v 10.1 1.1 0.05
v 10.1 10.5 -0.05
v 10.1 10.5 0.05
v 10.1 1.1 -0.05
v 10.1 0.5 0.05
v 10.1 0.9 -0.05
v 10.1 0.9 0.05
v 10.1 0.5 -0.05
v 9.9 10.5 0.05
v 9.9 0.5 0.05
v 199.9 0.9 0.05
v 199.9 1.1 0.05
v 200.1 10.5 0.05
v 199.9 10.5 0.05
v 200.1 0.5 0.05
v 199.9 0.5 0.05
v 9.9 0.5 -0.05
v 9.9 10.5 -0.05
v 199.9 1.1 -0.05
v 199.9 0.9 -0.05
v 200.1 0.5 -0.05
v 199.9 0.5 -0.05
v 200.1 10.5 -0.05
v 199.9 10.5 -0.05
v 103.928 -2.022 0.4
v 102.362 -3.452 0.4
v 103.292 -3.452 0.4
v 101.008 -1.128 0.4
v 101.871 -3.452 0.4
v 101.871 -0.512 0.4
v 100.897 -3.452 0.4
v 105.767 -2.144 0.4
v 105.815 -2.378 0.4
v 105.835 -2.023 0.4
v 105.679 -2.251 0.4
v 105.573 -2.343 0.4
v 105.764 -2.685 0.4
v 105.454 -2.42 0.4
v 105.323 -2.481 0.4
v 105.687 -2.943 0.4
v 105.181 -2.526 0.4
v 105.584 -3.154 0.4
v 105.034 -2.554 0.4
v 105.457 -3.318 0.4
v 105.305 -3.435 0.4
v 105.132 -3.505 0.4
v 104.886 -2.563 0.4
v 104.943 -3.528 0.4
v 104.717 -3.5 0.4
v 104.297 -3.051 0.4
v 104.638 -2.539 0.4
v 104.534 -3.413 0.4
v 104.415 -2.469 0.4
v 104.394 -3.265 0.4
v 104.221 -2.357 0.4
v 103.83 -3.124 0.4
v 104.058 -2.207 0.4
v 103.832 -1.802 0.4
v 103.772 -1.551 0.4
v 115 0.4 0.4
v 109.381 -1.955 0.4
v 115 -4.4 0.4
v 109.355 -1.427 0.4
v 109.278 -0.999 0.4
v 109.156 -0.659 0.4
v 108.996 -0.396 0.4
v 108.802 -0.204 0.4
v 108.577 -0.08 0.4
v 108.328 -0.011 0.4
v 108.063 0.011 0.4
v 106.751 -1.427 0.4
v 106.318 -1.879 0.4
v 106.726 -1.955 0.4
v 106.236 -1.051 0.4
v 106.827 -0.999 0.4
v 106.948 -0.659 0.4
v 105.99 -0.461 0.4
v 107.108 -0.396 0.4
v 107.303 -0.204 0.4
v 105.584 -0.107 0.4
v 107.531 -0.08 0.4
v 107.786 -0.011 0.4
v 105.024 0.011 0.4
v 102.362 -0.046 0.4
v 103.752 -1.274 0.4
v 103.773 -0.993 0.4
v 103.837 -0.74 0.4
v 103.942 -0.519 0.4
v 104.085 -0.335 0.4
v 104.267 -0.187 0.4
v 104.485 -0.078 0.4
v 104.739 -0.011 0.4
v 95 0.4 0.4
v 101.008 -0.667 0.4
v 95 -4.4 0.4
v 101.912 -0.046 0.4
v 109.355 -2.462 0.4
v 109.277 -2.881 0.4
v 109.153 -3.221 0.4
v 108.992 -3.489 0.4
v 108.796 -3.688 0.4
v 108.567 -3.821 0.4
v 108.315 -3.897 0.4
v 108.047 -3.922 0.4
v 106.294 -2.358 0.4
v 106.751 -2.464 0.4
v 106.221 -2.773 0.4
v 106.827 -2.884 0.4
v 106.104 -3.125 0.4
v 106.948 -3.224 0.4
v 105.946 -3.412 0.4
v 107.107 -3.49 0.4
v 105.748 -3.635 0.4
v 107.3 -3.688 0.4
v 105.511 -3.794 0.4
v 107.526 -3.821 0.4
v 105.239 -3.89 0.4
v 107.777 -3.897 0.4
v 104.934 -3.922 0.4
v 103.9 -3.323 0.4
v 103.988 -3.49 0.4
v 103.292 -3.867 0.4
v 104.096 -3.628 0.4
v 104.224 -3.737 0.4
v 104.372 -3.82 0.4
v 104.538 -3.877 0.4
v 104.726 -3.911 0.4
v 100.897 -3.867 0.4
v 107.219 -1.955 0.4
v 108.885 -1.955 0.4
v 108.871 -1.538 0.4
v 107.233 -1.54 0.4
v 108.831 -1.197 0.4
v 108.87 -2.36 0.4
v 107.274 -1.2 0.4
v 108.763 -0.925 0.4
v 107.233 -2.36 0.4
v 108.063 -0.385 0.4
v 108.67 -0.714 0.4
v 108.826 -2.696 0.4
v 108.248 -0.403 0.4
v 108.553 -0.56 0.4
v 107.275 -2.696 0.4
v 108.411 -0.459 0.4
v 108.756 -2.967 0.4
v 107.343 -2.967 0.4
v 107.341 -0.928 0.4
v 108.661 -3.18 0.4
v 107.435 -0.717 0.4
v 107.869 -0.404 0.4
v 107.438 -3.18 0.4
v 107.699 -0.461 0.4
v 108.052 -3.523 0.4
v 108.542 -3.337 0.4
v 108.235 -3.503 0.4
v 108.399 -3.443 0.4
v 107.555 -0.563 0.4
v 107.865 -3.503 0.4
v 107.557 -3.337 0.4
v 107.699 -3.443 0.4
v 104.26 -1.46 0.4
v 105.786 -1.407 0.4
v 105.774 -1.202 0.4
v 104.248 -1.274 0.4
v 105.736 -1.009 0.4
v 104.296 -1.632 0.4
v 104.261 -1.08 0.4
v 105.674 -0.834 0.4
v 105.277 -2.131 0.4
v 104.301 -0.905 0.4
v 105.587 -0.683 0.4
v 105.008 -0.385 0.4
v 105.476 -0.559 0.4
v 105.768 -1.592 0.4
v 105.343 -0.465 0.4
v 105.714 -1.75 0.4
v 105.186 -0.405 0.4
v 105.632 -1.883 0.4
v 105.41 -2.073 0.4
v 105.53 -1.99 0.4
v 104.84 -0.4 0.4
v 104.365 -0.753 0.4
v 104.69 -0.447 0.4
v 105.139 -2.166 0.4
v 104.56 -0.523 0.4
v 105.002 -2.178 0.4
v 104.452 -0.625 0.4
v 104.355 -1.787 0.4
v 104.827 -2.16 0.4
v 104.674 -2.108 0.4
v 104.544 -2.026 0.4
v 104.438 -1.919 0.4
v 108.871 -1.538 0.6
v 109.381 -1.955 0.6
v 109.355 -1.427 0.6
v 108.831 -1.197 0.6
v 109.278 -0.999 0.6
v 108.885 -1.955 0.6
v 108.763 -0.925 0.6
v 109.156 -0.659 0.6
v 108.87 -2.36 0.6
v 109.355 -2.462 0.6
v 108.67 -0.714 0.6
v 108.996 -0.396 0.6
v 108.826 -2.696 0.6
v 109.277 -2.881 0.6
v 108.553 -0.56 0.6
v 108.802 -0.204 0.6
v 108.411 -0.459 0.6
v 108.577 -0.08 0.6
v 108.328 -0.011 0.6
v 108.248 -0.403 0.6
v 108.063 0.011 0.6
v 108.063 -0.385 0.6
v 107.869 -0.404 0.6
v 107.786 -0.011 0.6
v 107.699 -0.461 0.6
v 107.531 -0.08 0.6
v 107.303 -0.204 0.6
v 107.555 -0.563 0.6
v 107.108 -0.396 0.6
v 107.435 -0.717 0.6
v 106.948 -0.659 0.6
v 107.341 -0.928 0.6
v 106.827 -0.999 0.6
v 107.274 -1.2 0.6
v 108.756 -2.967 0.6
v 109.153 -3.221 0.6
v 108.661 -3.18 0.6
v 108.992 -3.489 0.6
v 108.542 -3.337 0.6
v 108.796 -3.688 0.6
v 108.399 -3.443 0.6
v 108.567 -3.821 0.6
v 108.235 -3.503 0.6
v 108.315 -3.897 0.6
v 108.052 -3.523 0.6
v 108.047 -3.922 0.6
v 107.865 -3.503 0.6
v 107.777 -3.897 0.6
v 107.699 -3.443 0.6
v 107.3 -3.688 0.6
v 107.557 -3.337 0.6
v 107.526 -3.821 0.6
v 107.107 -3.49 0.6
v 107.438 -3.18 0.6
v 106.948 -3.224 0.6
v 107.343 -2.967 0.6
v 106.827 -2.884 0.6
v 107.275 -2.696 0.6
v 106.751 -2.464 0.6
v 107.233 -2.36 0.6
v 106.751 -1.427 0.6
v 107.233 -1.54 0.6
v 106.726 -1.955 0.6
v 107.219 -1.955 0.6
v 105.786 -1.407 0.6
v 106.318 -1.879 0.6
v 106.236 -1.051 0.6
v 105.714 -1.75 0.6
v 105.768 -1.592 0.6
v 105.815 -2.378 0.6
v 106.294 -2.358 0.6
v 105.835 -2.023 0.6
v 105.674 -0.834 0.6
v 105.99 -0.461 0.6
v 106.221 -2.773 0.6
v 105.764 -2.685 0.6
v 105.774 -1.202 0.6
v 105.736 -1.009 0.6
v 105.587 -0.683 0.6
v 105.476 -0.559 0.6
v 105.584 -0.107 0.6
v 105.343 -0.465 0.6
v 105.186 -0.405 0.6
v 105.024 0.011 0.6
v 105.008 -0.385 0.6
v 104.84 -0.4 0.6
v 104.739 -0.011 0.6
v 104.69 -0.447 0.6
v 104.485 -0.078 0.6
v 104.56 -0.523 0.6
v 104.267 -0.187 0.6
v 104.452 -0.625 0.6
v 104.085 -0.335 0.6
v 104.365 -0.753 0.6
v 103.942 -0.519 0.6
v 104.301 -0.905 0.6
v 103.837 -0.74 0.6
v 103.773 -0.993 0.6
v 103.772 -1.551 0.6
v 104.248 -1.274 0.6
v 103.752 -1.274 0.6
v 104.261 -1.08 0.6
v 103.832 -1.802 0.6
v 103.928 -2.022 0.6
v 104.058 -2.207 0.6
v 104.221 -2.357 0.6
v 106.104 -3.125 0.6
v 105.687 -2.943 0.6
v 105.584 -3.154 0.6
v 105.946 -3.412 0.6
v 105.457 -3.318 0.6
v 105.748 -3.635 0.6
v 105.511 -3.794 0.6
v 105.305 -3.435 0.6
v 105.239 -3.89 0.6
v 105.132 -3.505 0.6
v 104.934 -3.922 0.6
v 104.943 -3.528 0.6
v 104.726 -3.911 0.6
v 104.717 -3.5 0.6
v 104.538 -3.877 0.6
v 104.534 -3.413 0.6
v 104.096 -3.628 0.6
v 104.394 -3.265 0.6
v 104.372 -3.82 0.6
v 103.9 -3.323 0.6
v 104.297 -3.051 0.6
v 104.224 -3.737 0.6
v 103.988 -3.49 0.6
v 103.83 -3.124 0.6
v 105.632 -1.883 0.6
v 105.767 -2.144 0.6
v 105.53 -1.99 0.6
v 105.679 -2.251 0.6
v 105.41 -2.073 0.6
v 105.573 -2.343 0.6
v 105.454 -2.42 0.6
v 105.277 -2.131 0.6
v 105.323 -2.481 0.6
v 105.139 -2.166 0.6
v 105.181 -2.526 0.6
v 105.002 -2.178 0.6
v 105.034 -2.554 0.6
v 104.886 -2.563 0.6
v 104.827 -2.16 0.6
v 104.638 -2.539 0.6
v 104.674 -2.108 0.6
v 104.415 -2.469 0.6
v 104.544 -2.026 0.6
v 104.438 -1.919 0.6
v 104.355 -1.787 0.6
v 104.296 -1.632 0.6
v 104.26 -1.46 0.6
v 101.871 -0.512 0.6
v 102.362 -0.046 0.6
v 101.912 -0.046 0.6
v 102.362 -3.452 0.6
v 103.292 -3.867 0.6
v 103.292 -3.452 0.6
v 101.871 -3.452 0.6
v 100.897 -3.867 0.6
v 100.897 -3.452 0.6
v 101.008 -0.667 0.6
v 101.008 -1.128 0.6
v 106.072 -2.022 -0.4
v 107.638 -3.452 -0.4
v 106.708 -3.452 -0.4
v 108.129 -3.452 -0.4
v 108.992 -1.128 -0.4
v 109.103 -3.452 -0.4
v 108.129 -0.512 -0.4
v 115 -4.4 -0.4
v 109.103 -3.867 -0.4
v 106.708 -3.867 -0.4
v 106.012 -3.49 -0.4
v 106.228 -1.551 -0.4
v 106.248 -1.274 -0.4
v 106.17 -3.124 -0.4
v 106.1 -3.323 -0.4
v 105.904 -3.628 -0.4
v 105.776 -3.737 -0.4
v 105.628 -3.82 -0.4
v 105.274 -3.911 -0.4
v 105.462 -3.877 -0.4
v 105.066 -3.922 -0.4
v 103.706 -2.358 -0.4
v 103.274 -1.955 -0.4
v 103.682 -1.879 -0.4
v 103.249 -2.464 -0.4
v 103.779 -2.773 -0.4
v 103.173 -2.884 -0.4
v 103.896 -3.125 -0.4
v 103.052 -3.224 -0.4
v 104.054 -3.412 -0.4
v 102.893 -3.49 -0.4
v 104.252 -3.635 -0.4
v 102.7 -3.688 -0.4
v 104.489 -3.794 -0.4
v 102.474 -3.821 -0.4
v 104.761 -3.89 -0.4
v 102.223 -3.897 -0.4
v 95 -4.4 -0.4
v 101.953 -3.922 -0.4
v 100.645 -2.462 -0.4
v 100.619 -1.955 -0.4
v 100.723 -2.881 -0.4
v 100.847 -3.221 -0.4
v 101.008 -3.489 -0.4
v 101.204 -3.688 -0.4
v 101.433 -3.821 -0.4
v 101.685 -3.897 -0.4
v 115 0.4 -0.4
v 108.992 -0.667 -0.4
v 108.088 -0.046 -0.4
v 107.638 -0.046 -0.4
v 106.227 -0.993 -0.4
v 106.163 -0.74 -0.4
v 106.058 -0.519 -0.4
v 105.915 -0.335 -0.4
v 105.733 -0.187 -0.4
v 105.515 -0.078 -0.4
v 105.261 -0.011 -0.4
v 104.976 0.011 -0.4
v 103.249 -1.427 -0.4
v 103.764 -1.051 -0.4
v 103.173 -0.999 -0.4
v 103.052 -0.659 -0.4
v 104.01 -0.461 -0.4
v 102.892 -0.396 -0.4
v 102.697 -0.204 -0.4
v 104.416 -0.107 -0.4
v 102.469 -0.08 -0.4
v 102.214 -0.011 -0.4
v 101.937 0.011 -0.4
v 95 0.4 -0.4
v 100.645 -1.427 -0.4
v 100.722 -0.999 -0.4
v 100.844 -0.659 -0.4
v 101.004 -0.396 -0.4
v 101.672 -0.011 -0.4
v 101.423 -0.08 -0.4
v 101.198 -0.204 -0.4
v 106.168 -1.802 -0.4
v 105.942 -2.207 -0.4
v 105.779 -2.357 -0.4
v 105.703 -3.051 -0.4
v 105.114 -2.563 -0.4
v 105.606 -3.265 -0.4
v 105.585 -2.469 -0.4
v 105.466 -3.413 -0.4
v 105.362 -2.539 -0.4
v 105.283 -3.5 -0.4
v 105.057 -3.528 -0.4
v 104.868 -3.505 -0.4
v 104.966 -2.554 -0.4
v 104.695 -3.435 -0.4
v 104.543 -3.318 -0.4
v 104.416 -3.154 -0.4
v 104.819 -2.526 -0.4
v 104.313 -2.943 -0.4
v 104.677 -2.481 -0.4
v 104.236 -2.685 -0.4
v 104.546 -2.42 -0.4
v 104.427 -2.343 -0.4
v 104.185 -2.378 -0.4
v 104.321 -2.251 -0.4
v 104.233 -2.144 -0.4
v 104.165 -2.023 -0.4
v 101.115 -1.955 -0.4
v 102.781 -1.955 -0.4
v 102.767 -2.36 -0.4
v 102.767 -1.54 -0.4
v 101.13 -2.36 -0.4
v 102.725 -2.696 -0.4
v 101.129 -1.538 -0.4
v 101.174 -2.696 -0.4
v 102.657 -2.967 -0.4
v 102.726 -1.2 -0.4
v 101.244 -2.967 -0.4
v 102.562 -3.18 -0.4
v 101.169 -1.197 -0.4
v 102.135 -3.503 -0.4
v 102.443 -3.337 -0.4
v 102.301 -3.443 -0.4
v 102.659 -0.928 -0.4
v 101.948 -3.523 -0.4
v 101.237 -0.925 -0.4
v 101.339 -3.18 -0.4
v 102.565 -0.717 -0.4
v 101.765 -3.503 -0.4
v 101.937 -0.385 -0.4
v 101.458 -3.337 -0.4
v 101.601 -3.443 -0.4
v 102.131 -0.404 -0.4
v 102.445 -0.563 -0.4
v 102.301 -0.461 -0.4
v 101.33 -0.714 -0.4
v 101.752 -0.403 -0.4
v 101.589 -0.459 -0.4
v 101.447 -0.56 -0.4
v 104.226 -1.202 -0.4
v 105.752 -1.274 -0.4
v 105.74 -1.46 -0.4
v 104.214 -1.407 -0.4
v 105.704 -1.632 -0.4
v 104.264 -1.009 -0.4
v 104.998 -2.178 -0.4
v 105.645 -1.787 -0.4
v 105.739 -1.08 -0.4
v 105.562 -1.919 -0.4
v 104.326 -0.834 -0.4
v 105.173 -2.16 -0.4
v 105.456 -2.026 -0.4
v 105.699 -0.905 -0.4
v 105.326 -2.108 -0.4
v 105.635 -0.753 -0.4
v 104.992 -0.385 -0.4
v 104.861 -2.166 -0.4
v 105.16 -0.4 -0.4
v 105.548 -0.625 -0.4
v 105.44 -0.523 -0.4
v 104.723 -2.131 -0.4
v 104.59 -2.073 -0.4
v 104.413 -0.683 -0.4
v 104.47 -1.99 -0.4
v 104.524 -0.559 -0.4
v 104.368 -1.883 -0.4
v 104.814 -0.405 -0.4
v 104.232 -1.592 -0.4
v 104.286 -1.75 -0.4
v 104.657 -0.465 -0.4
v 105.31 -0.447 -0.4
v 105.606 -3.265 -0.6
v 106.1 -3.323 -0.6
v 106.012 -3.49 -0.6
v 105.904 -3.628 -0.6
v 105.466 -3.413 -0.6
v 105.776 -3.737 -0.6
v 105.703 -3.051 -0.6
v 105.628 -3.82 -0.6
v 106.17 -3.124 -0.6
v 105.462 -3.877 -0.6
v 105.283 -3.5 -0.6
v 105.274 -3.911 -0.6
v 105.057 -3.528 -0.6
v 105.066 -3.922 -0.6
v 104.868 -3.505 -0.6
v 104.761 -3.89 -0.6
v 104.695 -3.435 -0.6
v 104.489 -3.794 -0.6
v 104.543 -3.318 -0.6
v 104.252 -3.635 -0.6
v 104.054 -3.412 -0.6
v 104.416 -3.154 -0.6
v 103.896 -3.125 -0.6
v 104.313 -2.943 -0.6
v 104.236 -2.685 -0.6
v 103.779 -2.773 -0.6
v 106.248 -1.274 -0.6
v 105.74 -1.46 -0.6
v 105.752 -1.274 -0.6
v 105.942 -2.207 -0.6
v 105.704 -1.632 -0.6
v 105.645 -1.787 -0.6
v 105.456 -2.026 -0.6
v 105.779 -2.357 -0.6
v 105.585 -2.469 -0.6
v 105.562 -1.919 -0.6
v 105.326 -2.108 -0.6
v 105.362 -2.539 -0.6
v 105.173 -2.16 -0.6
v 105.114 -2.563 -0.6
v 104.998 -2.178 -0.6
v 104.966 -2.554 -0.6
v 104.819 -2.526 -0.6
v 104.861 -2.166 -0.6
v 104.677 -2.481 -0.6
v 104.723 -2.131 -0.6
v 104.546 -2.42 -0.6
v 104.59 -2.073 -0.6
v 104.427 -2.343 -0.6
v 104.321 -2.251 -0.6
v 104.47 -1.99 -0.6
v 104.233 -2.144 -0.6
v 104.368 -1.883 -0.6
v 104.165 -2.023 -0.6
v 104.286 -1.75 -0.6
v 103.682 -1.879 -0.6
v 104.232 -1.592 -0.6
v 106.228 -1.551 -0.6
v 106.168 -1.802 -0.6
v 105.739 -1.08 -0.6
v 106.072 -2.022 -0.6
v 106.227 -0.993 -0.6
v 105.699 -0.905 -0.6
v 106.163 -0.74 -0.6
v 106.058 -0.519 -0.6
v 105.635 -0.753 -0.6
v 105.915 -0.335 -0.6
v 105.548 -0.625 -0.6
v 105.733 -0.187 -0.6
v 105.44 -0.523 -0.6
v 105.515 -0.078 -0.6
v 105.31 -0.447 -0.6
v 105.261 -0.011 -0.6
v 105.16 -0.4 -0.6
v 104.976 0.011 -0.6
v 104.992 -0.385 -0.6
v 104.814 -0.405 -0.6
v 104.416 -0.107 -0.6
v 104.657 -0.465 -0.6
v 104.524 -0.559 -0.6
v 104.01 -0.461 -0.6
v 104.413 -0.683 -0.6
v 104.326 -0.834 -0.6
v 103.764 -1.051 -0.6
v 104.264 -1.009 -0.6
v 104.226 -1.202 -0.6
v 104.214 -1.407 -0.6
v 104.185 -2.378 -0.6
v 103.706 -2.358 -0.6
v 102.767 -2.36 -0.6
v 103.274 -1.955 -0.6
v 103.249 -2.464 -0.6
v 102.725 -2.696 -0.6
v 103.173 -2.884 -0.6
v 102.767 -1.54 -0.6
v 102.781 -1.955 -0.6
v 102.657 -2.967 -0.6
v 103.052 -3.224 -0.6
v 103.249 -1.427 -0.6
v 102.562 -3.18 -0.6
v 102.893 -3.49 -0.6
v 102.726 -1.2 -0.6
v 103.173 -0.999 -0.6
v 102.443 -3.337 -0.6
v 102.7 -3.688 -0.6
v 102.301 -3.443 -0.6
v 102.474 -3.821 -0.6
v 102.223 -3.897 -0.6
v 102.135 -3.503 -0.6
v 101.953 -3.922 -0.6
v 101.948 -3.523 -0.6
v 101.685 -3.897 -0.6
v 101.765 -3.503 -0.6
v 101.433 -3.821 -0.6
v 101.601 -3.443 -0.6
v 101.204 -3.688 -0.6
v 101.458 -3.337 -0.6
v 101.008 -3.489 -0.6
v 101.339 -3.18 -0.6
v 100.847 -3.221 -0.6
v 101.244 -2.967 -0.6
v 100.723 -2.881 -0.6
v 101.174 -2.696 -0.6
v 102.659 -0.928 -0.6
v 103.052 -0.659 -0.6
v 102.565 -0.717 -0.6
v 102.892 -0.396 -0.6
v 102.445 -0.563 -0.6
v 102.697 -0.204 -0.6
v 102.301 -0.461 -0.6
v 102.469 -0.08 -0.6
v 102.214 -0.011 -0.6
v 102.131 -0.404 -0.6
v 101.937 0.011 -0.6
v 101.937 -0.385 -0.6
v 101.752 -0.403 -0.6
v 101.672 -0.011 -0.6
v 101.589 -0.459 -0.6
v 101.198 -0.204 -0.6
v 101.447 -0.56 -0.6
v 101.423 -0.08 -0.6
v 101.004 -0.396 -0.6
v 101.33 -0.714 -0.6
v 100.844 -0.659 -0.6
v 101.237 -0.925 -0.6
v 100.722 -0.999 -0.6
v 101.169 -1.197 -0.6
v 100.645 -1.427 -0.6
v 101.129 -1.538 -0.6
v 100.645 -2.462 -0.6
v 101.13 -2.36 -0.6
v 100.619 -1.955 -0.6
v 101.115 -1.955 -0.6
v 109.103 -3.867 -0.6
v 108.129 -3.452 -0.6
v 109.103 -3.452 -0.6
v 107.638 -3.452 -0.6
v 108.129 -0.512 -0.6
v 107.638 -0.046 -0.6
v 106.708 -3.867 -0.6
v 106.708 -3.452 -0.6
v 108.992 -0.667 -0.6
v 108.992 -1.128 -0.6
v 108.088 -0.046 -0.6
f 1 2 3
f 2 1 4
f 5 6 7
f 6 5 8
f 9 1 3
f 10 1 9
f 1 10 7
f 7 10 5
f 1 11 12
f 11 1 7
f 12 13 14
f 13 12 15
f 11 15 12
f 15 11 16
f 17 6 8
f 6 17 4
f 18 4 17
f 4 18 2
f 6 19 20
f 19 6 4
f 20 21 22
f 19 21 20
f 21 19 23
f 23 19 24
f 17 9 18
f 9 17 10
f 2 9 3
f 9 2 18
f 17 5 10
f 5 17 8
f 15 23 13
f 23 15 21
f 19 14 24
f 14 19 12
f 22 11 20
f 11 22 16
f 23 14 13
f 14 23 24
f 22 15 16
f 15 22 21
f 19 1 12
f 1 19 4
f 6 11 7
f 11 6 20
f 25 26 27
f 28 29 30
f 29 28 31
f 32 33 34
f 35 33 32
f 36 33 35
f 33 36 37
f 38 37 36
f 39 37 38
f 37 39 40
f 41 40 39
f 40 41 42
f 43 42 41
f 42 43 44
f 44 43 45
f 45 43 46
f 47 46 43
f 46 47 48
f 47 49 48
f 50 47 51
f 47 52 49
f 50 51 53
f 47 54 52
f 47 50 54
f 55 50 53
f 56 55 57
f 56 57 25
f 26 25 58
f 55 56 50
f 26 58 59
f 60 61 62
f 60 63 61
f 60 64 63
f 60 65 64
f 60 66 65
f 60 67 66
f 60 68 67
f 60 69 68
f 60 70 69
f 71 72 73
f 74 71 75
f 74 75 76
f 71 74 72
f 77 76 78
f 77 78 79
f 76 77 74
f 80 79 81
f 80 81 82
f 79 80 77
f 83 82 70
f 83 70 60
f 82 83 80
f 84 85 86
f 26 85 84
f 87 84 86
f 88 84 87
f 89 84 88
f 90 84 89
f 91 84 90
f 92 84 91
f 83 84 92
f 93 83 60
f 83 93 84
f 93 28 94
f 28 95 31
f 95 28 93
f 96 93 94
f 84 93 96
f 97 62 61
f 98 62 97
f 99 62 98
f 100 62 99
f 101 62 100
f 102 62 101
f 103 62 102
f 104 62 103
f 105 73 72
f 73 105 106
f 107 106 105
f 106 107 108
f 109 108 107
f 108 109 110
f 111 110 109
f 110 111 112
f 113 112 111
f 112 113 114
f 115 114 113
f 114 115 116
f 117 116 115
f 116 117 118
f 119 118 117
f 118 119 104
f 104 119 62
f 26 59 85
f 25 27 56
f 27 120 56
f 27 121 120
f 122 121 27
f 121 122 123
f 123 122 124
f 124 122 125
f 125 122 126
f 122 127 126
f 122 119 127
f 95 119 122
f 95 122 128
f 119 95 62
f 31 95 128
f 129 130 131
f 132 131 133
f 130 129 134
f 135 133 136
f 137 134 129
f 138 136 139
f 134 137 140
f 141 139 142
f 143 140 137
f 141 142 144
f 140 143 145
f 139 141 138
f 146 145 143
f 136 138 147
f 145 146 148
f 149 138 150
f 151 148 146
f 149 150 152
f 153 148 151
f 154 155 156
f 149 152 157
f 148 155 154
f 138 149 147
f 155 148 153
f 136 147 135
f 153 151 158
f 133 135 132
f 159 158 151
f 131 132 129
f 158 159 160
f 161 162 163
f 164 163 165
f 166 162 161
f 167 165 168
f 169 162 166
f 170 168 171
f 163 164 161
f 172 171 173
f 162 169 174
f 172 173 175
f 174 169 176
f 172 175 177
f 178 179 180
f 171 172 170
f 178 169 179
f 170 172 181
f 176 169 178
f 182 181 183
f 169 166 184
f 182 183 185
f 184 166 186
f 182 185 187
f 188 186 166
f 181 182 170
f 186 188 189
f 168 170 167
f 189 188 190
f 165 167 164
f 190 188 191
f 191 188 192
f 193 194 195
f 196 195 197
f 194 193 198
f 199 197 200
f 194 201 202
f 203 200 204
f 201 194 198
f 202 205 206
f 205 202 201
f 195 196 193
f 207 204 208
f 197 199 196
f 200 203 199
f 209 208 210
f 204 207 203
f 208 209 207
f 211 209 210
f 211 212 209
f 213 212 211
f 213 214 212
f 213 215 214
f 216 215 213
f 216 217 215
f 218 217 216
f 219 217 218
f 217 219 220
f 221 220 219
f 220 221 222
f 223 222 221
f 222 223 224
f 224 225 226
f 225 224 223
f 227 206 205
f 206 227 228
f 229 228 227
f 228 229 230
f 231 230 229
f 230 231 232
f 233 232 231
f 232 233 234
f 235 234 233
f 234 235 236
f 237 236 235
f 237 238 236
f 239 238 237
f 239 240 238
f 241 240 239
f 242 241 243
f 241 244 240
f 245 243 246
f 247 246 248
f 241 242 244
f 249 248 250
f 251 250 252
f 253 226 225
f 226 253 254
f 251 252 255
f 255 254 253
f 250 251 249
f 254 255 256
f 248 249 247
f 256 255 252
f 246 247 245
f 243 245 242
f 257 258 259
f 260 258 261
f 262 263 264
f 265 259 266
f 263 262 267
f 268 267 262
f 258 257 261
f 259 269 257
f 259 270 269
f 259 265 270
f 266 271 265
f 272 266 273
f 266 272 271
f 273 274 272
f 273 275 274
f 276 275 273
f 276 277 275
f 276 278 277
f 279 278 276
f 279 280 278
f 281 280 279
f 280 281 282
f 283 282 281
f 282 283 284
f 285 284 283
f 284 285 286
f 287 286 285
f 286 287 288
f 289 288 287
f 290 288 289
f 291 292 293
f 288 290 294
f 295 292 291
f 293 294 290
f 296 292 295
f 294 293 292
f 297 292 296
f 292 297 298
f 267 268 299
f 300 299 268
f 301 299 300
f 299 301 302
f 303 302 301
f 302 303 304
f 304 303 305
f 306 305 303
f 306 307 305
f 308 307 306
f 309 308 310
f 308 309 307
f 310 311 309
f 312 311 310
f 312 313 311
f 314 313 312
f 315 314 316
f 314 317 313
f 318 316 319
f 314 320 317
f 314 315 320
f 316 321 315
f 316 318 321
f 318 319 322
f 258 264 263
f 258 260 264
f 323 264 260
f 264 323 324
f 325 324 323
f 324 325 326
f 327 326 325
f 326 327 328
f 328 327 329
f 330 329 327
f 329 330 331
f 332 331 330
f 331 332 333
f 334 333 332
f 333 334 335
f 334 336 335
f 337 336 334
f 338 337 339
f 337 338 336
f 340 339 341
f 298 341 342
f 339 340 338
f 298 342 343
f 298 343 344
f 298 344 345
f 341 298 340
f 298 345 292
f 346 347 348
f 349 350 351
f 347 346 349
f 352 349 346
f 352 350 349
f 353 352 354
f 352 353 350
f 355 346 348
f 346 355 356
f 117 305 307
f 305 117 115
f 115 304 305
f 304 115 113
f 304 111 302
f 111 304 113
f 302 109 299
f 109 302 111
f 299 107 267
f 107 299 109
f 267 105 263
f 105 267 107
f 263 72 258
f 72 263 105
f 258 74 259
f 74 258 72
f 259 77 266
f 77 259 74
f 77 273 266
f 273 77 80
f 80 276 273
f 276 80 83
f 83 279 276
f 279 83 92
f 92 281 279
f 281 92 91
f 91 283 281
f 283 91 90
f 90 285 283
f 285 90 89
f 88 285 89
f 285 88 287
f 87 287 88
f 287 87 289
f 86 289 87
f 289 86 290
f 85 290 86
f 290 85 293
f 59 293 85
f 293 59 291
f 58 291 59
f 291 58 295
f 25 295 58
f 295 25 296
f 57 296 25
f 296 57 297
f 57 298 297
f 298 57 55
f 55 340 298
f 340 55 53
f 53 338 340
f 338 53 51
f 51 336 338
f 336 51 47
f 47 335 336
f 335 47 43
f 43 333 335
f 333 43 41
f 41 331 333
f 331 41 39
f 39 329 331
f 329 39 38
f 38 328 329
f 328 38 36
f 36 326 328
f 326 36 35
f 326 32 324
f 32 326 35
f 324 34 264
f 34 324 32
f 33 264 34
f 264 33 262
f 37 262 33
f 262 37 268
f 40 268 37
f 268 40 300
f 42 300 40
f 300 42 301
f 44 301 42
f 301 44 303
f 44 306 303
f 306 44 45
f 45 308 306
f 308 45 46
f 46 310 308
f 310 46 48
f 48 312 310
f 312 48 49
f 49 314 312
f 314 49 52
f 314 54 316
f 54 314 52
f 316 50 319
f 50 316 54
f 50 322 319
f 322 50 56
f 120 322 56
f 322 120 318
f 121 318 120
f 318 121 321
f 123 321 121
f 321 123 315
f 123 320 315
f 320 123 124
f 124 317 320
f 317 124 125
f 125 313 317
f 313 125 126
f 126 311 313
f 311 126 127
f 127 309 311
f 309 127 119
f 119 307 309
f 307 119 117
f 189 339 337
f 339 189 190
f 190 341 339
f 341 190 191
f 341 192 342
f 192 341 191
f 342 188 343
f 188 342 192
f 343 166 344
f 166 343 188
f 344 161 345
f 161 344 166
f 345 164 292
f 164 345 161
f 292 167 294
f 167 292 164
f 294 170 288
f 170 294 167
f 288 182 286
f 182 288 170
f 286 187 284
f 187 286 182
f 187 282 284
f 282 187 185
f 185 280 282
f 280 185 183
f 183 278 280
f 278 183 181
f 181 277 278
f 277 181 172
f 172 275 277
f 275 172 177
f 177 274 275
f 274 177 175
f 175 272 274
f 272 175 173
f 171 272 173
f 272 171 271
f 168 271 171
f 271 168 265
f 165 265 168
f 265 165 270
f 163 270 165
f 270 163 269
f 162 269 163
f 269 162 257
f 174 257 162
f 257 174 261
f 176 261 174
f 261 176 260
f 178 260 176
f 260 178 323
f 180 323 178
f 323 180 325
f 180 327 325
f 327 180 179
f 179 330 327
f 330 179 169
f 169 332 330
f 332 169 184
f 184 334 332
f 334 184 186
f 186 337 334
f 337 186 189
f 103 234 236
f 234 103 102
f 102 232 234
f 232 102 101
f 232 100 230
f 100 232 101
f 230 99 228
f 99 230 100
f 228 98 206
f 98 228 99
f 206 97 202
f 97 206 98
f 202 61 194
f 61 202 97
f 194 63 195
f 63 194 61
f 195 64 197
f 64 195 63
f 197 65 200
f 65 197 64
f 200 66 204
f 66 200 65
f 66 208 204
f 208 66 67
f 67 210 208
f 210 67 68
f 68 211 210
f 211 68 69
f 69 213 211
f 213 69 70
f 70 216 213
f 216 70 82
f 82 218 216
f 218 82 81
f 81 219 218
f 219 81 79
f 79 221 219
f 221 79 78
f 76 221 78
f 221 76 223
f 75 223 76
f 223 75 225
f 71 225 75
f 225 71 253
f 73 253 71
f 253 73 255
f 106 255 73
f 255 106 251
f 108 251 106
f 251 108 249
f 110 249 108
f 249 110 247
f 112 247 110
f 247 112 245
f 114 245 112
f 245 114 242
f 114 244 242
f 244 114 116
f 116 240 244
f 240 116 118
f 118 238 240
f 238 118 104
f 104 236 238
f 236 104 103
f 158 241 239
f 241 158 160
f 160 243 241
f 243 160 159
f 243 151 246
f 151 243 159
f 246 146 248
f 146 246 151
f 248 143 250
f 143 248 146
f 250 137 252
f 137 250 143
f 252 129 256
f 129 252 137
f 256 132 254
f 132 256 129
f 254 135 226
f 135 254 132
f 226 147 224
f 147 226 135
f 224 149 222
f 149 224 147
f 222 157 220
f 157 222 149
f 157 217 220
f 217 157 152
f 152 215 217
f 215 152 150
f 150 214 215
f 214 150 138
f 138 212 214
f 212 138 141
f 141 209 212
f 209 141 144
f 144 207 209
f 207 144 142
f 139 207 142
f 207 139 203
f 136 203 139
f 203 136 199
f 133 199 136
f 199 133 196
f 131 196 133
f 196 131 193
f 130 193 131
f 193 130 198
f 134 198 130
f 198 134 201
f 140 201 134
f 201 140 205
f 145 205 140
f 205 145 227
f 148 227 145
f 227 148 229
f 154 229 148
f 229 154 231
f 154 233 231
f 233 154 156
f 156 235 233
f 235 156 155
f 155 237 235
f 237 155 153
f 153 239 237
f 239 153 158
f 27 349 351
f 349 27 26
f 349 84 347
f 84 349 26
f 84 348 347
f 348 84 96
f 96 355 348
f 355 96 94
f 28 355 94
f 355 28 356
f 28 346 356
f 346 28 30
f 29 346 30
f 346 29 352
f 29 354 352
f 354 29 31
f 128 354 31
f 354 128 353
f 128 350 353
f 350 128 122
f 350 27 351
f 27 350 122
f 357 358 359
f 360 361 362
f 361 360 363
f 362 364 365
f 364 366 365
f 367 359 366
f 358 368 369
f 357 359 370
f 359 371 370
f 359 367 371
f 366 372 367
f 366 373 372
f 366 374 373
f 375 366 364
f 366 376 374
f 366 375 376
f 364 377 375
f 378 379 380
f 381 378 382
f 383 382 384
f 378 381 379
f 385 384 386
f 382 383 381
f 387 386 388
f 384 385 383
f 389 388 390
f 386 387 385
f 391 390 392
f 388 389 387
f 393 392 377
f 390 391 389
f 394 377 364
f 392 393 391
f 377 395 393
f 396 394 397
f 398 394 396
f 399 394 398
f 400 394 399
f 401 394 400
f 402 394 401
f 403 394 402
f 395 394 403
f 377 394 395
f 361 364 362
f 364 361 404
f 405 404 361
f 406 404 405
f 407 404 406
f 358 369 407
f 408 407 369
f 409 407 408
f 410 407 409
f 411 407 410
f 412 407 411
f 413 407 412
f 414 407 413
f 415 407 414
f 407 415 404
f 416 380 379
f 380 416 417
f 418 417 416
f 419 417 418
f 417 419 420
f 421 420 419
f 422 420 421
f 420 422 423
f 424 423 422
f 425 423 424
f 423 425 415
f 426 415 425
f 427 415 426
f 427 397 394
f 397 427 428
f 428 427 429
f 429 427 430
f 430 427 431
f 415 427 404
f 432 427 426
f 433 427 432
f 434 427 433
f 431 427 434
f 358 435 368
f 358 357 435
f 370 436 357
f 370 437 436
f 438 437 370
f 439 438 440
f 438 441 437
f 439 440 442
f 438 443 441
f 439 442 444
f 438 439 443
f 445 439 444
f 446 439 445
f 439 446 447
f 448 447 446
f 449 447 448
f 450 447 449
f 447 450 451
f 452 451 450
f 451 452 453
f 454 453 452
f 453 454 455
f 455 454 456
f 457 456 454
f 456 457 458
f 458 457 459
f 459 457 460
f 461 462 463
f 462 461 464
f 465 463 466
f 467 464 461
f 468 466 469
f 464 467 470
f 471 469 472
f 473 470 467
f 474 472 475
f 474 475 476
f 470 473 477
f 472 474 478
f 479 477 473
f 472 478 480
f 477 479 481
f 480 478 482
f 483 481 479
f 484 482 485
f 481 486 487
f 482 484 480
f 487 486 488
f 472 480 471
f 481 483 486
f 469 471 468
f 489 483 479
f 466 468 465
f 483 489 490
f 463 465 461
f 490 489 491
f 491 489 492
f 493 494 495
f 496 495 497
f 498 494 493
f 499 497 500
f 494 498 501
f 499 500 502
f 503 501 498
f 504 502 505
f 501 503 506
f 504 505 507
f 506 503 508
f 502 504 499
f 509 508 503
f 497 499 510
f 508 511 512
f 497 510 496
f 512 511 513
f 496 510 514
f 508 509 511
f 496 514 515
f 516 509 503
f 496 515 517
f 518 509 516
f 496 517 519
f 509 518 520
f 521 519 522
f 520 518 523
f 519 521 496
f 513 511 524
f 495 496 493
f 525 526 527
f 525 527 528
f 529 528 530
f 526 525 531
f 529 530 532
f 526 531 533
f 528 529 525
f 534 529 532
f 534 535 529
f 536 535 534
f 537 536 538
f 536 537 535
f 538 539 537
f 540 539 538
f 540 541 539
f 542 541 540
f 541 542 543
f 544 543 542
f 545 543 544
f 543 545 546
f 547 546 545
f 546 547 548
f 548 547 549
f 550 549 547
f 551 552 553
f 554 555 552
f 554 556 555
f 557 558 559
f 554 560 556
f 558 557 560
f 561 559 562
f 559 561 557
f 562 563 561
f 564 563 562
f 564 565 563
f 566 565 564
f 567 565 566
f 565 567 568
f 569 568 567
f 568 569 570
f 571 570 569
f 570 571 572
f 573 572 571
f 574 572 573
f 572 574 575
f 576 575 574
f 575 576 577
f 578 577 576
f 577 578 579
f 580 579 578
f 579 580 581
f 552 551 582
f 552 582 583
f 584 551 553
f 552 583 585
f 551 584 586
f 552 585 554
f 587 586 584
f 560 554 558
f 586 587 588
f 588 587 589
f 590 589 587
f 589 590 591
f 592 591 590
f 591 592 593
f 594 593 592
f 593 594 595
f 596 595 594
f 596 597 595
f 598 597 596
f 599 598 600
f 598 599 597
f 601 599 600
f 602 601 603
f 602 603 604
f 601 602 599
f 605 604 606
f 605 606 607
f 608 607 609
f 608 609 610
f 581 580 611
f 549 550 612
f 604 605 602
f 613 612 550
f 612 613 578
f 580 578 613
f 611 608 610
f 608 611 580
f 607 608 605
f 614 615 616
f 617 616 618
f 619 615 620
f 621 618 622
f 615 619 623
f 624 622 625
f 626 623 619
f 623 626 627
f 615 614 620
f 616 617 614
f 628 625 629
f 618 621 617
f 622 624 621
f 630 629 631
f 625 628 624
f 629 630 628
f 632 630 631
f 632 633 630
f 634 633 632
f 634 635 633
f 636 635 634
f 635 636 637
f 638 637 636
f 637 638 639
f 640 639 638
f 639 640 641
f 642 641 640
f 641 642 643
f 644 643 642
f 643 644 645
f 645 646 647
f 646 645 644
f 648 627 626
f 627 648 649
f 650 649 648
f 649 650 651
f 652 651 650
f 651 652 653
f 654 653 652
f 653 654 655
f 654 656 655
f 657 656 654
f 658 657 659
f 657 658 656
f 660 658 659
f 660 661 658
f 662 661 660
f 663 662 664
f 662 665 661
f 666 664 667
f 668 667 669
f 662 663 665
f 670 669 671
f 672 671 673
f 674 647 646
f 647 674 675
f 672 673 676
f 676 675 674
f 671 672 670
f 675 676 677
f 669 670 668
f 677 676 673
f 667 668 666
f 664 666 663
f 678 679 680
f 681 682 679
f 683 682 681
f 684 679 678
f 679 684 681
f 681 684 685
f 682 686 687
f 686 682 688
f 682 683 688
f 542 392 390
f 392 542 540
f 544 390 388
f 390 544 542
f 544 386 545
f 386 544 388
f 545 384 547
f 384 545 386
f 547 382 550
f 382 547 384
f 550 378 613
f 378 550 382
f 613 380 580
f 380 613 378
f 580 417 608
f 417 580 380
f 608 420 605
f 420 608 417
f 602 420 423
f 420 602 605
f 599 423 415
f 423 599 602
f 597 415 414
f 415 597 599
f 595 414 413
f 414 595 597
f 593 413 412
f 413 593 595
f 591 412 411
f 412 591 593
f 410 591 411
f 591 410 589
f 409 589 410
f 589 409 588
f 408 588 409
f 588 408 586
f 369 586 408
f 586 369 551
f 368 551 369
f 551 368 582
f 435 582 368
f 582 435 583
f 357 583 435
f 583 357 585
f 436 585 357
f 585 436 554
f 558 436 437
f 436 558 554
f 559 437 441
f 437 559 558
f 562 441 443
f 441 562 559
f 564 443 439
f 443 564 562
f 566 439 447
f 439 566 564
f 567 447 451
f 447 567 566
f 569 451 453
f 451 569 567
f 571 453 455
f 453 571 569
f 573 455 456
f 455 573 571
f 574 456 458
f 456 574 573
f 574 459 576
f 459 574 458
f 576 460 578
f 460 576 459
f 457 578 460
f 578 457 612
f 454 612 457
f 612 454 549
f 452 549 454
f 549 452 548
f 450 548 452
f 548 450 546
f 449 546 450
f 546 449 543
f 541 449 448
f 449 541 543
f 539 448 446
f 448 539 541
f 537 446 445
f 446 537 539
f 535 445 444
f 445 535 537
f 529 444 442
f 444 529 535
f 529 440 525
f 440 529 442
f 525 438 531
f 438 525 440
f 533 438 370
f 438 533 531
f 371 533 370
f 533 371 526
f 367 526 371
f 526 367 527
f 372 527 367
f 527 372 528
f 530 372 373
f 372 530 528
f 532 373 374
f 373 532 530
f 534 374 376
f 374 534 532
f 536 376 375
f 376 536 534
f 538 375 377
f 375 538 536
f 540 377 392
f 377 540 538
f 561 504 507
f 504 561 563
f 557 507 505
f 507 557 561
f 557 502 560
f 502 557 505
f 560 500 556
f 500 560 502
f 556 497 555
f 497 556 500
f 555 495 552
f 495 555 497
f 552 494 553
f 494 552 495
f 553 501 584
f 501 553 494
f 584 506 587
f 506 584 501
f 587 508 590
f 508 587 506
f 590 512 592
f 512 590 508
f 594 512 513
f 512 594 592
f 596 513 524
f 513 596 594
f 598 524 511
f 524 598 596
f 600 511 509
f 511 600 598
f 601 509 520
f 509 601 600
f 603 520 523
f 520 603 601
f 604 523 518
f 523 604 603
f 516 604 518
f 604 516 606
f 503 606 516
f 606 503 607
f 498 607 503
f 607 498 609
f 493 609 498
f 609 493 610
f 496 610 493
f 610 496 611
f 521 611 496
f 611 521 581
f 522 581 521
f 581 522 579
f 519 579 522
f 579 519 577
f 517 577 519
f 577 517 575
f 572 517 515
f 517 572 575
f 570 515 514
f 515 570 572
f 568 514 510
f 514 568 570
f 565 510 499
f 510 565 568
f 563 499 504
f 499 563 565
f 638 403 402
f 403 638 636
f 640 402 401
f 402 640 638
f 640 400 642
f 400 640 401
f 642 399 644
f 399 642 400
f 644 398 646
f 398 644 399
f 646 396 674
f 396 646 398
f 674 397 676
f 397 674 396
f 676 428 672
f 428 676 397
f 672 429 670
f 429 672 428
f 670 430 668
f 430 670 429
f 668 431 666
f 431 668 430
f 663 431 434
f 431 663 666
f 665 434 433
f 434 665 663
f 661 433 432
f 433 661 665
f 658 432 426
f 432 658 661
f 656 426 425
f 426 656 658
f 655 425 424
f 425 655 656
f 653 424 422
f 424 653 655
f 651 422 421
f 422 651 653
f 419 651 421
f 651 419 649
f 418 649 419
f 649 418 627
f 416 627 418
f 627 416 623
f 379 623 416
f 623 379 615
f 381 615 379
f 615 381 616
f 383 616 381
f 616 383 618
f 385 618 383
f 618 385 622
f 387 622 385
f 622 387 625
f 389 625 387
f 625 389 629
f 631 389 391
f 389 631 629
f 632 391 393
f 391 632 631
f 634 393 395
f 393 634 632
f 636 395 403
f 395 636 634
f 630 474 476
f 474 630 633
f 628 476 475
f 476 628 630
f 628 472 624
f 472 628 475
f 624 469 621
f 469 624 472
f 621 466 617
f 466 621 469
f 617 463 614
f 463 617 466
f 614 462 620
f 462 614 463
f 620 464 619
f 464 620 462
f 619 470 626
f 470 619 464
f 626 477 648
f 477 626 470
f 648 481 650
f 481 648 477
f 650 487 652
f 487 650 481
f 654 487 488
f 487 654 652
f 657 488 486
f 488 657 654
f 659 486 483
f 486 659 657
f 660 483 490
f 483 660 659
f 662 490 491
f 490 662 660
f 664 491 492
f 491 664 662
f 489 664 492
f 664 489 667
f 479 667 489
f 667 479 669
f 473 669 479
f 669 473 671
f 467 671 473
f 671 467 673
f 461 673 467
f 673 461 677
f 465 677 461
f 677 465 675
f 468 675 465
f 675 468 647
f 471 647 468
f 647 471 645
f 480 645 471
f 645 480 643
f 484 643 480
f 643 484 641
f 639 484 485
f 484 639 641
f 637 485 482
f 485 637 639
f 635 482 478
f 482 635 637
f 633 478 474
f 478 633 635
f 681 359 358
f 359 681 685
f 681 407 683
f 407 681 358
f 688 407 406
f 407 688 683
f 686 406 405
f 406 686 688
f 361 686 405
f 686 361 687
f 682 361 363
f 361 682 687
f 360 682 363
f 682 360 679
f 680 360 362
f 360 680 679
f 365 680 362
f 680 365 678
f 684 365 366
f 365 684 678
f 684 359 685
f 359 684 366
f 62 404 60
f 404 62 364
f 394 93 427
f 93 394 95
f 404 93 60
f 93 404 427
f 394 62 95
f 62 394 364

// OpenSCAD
module hdim(
  x1 = 10, 
  x2 = 200, 
  y = 10, 
  dimline_lenght = 9.0,
  scaling = 1.0) 
{
    dimline_overlap = scaling * 0.5;
    dimline_width = scaling * 0.2;
    text_size = scaling * 4;
    tmp = 2*dimline_overlap+text_size/2;
    scaled_dl_len = scaling * dimline_lenght;
    text_pos = scaled_dl_len>0 ? tmp : -tmp; 
    dimline_abs = scaled_dl_len>0 ? scaled_dl_len : -scaled_dl_len;
    
    color([146/255, 154/255, 255/255, 0.9])
    {
        translate([x1,y-scaled_dl_len/2,0]) 
            cube([dimline_width, 
                dimline_abs + 2*dimline_overlap,
                dimline_width/2], 
                center=true);
                
        translate([x2,y-scaled_dl_len/2,0]) 
            cube([dimline_width, 
                dimline_abs + 2*dimline_overlap,
                dimline_width/2], 
                center=true);

        translate([(x1+x2)/2,y-scaled_dl_len,0]) 
            cube([x2-x1, 
                dimline_width,
                dimline_width/2], 
                center=true);
    }
        
    translate([(x1+x2)/2,y-scaled_dl_len-text_pos,0]) 
    {
        color("WhiteSmoke")
        cube([text_size * 5, 1.2*text_size, 0.8*scaling], center=true);
        
        color([0,0,0,1])
        {
            translate([0,0,0.4*scaling])
            linear_extrude(0.2*scaling)
            text(str(0.1*round((x2-x1)*10)), size = text_size, 
                halign = "center",valign = "center");
            translate([0,0,-0.4*scaling])
            rotate([0,180,0])
            linear_extrude(0.2*scaling)
            text(str(0.1*round((x2-x1)*10)), size = text_size, 
                halign = "center",valign = "center");
        }
    }
}

hdim();
